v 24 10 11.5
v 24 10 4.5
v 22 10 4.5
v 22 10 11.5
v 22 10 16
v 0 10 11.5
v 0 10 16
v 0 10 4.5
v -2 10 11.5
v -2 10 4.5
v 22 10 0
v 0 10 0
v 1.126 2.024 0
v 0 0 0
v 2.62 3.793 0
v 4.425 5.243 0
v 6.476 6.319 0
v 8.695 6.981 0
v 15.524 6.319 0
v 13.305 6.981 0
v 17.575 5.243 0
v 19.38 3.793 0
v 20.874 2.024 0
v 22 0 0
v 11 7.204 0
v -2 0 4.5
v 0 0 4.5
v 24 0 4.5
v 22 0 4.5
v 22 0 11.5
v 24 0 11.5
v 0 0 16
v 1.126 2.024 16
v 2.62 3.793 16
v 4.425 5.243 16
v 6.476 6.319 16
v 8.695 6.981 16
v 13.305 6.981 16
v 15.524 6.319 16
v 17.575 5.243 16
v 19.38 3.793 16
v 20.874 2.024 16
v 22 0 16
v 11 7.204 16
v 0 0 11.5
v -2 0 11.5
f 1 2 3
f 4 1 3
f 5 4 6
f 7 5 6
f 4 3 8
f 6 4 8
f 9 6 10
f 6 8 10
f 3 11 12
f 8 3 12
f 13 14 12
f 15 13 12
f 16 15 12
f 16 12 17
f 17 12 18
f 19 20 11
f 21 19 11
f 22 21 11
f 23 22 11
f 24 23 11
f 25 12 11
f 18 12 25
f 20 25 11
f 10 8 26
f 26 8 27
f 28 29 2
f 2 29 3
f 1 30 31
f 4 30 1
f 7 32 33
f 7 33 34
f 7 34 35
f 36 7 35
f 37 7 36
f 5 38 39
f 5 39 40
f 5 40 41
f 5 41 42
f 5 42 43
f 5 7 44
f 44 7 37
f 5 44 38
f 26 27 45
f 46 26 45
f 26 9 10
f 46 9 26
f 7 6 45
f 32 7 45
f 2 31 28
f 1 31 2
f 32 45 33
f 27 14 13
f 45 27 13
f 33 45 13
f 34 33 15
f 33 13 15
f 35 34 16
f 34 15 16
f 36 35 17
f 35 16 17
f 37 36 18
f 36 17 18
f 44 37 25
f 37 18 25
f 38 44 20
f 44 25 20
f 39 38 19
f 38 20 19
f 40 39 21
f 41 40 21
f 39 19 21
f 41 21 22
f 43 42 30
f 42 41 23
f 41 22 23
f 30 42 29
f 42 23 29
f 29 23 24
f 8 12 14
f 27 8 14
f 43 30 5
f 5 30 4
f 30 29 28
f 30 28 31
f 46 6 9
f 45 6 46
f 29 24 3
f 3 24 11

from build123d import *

# Parameters (mm, degrees)
F1_DEPTH = 16
F2_W     = 10
F2_H     = 7
F3_DEPTH = 2
F4_W     = 10
F4_H     = 7
F5_DEPTH = 2


with BuildPart() as f1:
    # F0 (on Top) → F1 (new body)
    with BuildSketch(Plane.XY):
        with BuildLine():
            Line((0, 10), (0, 0))
            ThreePointArc((0, 0), (11, 7.204168), (22, 0))
            Line((22, 0), (22, 10))
            Line((22, 10), (0, 10))
        make_face()
    extrude(amount=F1_DEPTH)

    # F2 (on face) → F3 (join)
    with BuildSketch(Plane.YZ.offset(22)):
        with Locations((5, 8)):
            Rectangle(F2_W, F2_H)
    extrude(amount=F3_DEPTH)

    # F4 (on face) → F5 (join)
    with BuildSketch(Plane(origin=(0, 0, 0), x_dir=(0, -1, 0), z_dir=(-1, 0, 0))):
        with Locations((-5, 8)):
            Rectangle(F4_W, F4_H)
    extrude(amount=F5_DEPTH)


solid = f1.part
